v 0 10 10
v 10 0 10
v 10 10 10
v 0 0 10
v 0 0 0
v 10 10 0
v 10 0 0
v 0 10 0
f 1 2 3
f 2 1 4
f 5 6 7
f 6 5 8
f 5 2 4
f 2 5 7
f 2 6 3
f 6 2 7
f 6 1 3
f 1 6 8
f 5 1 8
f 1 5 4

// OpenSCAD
cube(size = 10);
/* Generated from the following ExpSolid code:

#! /usr/bin/env python

from pathlib import Path

from solid2 import *

# =============
# = Extension =
# =============
# This is more or less the same as -- regular -- SolidPython does when it
# writes a scad file. It appends the python source to the end of the *.scad
# file.
#
# If you like this, you can simply import this extension that should do it.
#
def attach_code_post_render(root):
    #find the "root" file
    calling_file = None

    import __main__
    # not called from a terminal?
    if hasattr(__main__, "__file__"):
        # extract filename and replace suffix
        calling_file = Path(__main__.__file__).absolute()
    else:
        return '' # no code available. Called from withing a python shell

    assert(calling_file.exists())

    # read source file
    with calling_file.open("r") as f:
        code_str = f.read()

        # escape /_* and *_/ because otherwise it would end this comment block which
        # we use to inject the solid code
        code_str = code_str.replace("/_*", "/_*")
        code_str = code_str.replace("*_/", "*_/")

        # return the string to be appended to the *.scad file
        return f'/_* Generated from the following ExpSolid code:\n\n' +\
               f'{code_str}*_/'

# register the post_render extension. This hooks it into the "_render" routine.
# It will be called after the root gets rendered. It's return string will be
# appended to the rendered string.
from solid2.core.extension_manager import default_extension_manager
default_extension_manager.register_post_render(attach_code_post_render)

# =============

if __name__ == "__main__":
    c = cube(10)
    c.save_as_scad()

*/
